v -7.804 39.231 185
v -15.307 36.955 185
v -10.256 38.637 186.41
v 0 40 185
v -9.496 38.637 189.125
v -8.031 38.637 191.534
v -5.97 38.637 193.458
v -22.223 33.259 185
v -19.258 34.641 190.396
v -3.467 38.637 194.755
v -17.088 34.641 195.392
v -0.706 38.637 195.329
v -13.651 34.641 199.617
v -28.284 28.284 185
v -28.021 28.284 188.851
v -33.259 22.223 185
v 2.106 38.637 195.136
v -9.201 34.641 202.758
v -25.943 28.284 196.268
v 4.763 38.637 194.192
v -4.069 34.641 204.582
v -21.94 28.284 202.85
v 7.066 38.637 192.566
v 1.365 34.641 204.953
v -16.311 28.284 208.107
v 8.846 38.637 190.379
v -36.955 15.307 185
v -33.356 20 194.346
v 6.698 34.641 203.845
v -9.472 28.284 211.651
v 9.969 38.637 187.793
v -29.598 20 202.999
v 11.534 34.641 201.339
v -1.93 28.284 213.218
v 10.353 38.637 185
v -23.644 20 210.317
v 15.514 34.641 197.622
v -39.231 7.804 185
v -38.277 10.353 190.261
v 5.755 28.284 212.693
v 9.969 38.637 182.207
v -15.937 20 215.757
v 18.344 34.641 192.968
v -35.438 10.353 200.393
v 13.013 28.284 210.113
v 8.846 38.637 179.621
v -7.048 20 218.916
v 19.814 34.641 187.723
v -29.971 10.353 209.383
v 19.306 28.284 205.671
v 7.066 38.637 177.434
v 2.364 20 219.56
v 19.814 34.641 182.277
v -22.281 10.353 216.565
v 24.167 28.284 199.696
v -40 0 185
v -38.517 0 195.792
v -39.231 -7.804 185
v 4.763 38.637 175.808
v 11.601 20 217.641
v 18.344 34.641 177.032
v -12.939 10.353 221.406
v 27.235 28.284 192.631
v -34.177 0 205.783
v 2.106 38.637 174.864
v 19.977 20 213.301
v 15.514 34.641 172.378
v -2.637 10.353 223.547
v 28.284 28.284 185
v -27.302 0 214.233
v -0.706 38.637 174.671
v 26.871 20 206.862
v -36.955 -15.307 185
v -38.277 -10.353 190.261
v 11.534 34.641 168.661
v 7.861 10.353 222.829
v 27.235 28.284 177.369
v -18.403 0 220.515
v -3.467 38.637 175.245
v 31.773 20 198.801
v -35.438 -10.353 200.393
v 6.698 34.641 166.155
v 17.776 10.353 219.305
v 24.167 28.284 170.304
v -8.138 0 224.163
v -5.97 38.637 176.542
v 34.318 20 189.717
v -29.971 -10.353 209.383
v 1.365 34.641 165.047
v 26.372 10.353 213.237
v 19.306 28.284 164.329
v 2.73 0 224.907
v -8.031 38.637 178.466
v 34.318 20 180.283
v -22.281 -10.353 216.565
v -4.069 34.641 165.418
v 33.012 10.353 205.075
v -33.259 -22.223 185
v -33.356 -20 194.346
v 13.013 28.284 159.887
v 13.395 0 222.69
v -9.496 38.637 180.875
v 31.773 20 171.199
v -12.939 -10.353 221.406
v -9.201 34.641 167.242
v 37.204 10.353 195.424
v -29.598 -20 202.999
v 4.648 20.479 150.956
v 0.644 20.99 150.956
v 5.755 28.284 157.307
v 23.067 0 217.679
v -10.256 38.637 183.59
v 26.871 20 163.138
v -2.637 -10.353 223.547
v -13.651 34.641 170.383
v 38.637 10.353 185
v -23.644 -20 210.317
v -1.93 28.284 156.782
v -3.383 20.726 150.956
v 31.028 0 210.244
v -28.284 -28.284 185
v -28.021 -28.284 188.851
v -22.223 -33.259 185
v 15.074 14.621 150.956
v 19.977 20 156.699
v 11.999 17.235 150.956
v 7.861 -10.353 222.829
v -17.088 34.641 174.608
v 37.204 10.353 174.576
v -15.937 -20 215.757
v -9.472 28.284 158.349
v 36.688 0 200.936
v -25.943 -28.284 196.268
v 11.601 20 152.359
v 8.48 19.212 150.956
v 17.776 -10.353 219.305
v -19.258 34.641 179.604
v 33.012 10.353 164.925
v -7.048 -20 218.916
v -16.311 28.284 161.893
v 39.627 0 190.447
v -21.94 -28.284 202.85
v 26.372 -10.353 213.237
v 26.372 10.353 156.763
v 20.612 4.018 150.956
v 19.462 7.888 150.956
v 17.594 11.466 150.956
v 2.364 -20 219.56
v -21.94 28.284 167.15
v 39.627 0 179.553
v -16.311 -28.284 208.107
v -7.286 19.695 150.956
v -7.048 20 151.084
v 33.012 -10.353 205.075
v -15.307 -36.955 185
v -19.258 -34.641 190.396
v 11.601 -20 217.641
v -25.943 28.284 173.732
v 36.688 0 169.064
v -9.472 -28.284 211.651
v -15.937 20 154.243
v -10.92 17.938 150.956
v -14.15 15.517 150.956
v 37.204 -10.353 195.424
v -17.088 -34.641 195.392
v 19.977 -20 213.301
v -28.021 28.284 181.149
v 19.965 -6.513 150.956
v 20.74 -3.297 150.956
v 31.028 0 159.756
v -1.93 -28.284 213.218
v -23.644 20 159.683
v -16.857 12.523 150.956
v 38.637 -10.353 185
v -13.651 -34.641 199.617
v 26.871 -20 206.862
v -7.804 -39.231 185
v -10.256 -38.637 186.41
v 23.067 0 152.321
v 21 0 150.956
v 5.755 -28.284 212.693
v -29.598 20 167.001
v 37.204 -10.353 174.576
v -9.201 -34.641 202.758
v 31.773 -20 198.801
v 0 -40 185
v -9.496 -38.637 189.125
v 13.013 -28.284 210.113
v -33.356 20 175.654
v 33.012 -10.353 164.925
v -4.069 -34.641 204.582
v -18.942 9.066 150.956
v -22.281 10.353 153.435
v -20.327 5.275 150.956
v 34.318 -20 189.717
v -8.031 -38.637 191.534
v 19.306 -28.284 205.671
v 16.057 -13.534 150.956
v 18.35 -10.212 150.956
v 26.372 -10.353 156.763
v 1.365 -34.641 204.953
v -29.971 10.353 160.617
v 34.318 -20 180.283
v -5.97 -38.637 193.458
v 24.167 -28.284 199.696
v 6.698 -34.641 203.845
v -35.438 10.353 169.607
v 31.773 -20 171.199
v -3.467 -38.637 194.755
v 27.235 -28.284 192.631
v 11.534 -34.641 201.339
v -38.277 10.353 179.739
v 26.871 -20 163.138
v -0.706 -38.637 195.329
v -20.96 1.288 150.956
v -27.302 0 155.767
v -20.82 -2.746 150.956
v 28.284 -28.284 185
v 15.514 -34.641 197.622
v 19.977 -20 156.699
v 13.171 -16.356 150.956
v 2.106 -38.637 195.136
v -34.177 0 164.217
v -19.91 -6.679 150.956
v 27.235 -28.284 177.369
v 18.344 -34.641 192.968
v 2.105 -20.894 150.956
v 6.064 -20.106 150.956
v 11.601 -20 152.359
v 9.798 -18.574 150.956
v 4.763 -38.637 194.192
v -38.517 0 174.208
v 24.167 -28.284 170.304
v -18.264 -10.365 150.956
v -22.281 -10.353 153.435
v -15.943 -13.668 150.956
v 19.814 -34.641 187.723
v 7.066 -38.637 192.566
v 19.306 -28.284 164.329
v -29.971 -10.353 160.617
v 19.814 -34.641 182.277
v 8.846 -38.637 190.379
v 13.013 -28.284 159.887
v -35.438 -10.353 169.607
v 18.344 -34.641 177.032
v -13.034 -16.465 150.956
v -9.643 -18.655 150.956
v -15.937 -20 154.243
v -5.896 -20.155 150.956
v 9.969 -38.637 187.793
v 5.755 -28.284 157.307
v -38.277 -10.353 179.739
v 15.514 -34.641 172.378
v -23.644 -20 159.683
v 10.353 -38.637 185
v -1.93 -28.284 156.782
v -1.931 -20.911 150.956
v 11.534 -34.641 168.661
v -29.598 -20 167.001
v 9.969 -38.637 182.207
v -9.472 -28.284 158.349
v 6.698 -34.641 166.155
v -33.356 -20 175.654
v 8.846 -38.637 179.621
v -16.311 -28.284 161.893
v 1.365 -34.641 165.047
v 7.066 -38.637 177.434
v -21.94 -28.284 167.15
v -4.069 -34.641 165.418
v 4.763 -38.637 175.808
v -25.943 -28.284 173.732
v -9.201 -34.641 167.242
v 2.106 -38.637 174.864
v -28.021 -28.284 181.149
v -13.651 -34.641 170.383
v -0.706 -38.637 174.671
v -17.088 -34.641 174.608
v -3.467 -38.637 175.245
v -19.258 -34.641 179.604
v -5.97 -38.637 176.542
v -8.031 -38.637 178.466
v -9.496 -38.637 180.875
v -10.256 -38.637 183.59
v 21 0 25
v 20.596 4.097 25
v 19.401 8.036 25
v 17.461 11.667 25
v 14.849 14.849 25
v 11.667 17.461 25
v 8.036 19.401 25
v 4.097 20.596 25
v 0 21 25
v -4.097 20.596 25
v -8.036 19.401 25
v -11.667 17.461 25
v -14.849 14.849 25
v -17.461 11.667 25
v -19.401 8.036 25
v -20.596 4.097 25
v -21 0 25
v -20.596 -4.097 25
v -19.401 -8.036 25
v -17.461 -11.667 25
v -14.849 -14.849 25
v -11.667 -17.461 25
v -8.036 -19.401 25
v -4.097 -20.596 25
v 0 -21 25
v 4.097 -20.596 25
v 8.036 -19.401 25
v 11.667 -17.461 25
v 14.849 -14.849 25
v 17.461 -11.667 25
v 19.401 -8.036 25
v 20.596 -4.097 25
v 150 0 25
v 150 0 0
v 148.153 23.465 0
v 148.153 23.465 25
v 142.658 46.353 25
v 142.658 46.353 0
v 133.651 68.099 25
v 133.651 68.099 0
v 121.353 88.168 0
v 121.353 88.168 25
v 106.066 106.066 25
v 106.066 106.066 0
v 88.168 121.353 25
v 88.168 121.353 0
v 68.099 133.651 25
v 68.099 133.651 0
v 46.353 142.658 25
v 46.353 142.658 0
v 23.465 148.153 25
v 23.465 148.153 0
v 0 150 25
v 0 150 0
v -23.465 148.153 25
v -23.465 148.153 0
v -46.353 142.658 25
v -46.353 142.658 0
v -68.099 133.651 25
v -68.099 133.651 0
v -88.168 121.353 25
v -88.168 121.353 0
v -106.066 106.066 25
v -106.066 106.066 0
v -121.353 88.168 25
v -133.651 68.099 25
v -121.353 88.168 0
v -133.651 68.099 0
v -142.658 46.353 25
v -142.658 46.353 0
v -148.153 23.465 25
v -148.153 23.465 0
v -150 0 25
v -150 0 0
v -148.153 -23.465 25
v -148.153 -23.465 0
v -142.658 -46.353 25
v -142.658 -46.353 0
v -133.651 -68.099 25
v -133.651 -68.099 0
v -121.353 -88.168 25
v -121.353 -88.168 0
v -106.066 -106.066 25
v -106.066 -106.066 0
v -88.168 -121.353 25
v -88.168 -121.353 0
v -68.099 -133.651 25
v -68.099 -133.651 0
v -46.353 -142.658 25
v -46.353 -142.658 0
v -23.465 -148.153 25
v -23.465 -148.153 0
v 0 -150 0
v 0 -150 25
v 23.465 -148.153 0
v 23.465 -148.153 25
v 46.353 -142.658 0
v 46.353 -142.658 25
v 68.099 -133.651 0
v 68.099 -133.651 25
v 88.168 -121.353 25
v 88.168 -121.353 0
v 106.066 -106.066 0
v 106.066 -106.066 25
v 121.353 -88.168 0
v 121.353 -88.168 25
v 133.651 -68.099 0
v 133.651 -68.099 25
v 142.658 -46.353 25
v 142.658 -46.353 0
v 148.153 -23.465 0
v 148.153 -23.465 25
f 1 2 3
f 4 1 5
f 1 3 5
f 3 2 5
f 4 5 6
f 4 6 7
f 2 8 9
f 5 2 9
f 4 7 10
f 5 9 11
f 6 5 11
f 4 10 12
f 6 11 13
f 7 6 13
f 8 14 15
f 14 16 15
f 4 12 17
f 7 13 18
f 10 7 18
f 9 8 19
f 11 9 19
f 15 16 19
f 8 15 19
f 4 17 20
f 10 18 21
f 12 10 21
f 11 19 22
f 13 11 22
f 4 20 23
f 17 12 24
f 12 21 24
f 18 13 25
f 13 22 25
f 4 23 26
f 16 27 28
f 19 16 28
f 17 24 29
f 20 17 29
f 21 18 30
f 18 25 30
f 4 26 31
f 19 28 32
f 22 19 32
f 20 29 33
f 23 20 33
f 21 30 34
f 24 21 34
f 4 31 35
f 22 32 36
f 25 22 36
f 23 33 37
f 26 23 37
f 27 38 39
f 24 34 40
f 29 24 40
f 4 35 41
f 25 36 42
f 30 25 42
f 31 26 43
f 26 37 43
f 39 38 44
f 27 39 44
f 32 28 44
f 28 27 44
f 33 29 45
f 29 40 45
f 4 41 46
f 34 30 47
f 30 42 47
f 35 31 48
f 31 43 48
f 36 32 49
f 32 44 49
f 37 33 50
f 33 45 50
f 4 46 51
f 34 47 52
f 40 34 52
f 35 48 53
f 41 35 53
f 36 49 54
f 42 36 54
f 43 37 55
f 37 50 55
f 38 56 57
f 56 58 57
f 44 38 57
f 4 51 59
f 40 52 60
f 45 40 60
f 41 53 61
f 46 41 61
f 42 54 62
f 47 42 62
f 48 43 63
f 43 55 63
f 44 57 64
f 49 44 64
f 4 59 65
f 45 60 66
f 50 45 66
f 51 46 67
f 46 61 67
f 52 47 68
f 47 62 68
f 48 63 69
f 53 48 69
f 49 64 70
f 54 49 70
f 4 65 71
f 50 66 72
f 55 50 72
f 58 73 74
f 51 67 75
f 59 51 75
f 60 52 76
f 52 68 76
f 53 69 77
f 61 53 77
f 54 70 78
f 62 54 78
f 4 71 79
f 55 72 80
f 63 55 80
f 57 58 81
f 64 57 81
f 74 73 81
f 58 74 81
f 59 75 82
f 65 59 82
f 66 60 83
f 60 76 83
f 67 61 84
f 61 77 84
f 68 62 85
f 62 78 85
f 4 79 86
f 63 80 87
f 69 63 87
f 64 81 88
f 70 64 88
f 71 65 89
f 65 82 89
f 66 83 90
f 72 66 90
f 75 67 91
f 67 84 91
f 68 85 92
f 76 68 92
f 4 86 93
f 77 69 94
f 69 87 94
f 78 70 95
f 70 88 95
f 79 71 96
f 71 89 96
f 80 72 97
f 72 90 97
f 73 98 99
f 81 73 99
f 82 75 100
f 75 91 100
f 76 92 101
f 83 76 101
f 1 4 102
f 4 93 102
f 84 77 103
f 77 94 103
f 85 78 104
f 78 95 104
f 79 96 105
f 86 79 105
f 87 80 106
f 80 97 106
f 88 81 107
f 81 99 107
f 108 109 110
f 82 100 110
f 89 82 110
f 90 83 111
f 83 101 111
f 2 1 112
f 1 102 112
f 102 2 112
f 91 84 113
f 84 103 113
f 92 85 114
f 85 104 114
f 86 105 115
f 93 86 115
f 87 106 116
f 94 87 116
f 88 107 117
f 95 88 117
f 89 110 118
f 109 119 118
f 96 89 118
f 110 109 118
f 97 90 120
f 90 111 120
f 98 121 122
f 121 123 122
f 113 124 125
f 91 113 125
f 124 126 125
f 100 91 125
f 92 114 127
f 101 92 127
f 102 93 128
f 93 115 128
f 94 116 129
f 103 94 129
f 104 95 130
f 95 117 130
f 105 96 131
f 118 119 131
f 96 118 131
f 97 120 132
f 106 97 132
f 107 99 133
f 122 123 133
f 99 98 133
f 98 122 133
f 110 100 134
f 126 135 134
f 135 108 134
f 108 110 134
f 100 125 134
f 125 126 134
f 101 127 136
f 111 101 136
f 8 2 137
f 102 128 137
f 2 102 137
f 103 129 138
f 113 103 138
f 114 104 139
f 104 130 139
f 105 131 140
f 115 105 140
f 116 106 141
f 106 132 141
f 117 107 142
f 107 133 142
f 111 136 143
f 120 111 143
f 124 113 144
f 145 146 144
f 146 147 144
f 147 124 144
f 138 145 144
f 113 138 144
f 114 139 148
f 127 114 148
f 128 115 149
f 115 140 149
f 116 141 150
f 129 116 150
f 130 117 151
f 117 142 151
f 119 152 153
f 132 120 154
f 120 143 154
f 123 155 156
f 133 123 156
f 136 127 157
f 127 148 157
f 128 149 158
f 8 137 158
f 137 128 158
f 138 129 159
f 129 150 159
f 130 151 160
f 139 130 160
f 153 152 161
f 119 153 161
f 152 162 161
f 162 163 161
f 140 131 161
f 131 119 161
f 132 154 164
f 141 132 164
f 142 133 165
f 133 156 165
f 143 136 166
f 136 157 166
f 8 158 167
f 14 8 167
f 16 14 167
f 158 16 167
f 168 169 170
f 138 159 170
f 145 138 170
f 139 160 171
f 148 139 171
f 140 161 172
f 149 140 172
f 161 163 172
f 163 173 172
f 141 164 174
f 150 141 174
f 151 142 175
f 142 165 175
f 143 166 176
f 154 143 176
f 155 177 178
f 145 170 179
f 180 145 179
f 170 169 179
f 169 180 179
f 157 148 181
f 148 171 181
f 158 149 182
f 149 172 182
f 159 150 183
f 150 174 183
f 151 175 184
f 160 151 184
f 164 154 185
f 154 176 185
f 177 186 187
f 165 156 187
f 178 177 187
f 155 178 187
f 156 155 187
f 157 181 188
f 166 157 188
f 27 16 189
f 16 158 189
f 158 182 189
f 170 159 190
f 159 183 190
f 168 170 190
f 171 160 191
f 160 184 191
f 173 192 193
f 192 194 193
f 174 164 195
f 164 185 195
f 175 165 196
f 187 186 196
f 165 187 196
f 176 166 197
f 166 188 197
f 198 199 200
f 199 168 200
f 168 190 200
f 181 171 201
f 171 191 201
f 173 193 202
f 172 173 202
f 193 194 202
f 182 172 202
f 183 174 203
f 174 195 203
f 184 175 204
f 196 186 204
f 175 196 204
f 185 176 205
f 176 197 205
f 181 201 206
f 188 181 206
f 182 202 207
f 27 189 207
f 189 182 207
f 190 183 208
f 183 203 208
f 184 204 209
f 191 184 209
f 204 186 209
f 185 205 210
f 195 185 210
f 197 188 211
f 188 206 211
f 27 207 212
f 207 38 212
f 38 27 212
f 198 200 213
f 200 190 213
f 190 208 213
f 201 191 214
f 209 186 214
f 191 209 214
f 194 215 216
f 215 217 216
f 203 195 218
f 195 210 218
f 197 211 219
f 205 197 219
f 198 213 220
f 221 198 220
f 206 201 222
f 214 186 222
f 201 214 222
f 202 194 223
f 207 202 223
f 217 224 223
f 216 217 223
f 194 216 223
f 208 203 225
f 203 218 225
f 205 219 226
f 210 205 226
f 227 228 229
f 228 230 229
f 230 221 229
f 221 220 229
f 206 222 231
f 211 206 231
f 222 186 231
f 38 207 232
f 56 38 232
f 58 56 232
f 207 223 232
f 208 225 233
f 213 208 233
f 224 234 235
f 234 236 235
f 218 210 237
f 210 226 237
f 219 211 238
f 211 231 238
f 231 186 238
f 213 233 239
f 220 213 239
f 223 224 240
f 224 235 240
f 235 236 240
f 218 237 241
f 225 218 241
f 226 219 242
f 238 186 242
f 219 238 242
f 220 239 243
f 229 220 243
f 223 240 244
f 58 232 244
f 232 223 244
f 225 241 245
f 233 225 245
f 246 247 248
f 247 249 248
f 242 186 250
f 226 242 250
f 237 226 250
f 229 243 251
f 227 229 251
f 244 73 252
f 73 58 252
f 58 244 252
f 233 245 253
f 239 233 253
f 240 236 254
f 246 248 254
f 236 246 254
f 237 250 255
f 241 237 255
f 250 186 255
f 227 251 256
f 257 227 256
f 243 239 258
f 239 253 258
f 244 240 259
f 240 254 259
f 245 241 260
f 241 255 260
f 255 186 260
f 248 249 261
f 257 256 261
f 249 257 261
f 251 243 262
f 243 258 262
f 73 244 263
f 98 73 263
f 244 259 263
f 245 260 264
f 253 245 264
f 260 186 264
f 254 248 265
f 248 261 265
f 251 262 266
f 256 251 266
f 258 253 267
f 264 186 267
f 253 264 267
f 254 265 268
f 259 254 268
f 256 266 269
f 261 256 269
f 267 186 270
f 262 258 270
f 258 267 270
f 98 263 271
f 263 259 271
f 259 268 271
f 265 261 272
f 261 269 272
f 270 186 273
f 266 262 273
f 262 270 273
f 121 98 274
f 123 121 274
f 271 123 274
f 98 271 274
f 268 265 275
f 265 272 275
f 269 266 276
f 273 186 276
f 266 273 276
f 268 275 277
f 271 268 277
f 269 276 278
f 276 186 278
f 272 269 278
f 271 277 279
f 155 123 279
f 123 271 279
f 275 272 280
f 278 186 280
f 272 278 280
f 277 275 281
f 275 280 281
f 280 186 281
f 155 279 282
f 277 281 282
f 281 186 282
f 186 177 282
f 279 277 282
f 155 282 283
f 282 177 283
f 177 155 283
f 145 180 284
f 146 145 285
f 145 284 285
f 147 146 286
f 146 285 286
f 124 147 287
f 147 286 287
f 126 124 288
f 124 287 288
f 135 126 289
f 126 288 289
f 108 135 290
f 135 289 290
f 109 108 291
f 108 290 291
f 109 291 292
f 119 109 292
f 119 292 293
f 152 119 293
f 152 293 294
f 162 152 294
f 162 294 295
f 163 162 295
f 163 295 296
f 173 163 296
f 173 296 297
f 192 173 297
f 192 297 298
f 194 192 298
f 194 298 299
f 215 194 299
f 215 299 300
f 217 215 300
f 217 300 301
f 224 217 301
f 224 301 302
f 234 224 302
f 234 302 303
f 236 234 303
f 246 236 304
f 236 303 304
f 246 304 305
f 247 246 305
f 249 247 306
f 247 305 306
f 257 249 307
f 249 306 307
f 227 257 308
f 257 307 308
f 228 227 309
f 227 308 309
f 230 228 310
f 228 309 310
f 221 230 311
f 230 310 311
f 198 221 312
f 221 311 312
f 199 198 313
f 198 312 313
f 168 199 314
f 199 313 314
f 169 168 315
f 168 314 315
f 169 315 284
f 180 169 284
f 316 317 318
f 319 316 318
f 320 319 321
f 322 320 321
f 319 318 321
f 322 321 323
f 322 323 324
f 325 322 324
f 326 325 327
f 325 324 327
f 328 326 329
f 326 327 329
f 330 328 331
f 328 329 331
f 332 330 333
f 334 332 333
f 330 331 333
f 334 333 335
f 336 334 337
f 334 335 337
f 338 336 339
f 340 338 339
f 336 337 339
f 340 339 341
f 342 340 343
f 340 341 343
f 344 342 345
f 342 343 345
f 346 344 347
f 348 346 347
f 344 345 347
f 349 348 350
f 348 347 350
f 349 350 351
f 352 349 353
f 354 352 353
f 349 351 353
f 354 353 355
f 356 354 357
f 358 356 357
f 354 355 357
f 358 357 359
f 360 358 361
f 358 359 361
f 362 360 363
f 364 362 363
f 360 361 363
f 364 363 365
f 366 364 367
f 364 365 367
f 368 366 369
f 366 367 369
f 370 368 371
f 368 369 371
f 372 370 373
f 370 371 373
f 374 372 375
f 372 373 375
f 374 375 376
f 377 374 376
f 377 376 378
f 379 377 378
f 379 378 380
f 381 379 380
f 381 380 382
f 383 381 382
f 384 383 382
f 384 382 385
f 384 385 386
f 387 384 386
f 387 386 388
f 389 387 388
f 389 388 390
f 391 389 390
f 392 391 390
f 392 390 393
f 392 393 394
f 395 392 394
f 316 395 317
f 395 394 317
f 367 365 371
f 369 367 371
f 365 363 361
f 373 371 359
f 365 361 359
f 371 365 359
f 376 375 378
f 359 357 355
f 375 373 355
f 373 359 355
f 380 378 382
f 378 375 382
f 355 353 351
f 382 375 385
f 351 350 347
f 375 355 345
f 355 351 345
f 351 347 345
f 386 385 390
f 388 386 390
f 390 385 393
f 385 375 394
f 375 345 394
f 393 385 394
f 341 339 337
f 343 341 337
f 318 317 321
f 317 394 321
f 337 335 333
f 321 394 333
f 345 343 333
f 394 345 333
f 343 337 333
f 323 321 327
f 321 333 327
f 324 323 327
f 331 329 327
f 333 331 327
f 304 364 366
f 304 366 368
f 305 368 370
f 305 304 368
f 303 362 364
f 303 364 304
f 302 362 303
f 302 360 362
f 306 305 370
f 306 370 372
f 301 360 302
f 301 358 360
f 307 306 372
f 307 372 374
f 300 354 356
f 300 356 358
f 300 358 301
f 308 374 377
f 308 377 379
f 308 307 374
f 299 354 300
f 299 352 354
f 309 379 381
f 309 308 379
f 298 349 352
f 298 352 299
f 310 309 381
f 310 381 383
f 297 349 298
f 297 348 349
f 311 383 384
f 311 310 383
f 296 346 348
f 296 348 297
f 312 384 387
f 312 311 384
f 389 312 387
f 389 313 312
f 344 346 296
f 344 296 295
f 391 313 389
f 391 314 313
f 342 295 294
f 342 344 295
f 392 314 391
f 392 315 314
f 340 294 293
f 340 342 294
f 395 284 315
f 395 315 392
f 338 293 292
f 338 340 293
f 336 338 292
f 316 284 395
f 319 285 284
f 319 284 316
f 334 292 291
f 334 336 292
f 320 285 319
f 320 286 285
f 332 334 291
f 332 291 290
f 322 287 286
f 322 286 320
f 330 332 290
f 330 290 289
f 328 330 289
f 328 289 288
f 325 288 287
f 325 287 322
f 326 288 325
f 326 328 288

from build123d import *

# Parameters (mm, degrees)
F0_R     = 150
F1_DEPTH = 25
F2_R     = 21
F3_DEPTH = 160


with BuildPart() as f1:
    # F0 (on Top) → F1 (new body)
    with BuildSketch(Plane.XY):
        Circle(F0_R)
    extrude(amount=F1_DEPTH)

    # F2 (on face) → F3 (join)
    with BuildSketch(Plane.XY.offset(25)):
        Circle(F2_R)
    extrude(amount=F3_DEPTH)

    # F4 (on face) → F5 (revolve)
    with BuildSketch(Plane.XY.offset(185)):
        with BuildLine():
            Line((0, 21), (0, 40))
            ThreePointArc((0, 40), (-40, 0), (0, -40))
            Line((0, -40), (0, -21))
            ThreePointArc((0, -21), (-21, 0), (0, 21))
        make_face()
        with BuildLine():
            Line((0, -21), (0, 21))
            ThreePointArc((0, 21), (-21, 0), (0, -21))
        make_face()
    revolve(axis=Axis((0, 0, 185), (0, 1, 0)))


solid = f1.part
